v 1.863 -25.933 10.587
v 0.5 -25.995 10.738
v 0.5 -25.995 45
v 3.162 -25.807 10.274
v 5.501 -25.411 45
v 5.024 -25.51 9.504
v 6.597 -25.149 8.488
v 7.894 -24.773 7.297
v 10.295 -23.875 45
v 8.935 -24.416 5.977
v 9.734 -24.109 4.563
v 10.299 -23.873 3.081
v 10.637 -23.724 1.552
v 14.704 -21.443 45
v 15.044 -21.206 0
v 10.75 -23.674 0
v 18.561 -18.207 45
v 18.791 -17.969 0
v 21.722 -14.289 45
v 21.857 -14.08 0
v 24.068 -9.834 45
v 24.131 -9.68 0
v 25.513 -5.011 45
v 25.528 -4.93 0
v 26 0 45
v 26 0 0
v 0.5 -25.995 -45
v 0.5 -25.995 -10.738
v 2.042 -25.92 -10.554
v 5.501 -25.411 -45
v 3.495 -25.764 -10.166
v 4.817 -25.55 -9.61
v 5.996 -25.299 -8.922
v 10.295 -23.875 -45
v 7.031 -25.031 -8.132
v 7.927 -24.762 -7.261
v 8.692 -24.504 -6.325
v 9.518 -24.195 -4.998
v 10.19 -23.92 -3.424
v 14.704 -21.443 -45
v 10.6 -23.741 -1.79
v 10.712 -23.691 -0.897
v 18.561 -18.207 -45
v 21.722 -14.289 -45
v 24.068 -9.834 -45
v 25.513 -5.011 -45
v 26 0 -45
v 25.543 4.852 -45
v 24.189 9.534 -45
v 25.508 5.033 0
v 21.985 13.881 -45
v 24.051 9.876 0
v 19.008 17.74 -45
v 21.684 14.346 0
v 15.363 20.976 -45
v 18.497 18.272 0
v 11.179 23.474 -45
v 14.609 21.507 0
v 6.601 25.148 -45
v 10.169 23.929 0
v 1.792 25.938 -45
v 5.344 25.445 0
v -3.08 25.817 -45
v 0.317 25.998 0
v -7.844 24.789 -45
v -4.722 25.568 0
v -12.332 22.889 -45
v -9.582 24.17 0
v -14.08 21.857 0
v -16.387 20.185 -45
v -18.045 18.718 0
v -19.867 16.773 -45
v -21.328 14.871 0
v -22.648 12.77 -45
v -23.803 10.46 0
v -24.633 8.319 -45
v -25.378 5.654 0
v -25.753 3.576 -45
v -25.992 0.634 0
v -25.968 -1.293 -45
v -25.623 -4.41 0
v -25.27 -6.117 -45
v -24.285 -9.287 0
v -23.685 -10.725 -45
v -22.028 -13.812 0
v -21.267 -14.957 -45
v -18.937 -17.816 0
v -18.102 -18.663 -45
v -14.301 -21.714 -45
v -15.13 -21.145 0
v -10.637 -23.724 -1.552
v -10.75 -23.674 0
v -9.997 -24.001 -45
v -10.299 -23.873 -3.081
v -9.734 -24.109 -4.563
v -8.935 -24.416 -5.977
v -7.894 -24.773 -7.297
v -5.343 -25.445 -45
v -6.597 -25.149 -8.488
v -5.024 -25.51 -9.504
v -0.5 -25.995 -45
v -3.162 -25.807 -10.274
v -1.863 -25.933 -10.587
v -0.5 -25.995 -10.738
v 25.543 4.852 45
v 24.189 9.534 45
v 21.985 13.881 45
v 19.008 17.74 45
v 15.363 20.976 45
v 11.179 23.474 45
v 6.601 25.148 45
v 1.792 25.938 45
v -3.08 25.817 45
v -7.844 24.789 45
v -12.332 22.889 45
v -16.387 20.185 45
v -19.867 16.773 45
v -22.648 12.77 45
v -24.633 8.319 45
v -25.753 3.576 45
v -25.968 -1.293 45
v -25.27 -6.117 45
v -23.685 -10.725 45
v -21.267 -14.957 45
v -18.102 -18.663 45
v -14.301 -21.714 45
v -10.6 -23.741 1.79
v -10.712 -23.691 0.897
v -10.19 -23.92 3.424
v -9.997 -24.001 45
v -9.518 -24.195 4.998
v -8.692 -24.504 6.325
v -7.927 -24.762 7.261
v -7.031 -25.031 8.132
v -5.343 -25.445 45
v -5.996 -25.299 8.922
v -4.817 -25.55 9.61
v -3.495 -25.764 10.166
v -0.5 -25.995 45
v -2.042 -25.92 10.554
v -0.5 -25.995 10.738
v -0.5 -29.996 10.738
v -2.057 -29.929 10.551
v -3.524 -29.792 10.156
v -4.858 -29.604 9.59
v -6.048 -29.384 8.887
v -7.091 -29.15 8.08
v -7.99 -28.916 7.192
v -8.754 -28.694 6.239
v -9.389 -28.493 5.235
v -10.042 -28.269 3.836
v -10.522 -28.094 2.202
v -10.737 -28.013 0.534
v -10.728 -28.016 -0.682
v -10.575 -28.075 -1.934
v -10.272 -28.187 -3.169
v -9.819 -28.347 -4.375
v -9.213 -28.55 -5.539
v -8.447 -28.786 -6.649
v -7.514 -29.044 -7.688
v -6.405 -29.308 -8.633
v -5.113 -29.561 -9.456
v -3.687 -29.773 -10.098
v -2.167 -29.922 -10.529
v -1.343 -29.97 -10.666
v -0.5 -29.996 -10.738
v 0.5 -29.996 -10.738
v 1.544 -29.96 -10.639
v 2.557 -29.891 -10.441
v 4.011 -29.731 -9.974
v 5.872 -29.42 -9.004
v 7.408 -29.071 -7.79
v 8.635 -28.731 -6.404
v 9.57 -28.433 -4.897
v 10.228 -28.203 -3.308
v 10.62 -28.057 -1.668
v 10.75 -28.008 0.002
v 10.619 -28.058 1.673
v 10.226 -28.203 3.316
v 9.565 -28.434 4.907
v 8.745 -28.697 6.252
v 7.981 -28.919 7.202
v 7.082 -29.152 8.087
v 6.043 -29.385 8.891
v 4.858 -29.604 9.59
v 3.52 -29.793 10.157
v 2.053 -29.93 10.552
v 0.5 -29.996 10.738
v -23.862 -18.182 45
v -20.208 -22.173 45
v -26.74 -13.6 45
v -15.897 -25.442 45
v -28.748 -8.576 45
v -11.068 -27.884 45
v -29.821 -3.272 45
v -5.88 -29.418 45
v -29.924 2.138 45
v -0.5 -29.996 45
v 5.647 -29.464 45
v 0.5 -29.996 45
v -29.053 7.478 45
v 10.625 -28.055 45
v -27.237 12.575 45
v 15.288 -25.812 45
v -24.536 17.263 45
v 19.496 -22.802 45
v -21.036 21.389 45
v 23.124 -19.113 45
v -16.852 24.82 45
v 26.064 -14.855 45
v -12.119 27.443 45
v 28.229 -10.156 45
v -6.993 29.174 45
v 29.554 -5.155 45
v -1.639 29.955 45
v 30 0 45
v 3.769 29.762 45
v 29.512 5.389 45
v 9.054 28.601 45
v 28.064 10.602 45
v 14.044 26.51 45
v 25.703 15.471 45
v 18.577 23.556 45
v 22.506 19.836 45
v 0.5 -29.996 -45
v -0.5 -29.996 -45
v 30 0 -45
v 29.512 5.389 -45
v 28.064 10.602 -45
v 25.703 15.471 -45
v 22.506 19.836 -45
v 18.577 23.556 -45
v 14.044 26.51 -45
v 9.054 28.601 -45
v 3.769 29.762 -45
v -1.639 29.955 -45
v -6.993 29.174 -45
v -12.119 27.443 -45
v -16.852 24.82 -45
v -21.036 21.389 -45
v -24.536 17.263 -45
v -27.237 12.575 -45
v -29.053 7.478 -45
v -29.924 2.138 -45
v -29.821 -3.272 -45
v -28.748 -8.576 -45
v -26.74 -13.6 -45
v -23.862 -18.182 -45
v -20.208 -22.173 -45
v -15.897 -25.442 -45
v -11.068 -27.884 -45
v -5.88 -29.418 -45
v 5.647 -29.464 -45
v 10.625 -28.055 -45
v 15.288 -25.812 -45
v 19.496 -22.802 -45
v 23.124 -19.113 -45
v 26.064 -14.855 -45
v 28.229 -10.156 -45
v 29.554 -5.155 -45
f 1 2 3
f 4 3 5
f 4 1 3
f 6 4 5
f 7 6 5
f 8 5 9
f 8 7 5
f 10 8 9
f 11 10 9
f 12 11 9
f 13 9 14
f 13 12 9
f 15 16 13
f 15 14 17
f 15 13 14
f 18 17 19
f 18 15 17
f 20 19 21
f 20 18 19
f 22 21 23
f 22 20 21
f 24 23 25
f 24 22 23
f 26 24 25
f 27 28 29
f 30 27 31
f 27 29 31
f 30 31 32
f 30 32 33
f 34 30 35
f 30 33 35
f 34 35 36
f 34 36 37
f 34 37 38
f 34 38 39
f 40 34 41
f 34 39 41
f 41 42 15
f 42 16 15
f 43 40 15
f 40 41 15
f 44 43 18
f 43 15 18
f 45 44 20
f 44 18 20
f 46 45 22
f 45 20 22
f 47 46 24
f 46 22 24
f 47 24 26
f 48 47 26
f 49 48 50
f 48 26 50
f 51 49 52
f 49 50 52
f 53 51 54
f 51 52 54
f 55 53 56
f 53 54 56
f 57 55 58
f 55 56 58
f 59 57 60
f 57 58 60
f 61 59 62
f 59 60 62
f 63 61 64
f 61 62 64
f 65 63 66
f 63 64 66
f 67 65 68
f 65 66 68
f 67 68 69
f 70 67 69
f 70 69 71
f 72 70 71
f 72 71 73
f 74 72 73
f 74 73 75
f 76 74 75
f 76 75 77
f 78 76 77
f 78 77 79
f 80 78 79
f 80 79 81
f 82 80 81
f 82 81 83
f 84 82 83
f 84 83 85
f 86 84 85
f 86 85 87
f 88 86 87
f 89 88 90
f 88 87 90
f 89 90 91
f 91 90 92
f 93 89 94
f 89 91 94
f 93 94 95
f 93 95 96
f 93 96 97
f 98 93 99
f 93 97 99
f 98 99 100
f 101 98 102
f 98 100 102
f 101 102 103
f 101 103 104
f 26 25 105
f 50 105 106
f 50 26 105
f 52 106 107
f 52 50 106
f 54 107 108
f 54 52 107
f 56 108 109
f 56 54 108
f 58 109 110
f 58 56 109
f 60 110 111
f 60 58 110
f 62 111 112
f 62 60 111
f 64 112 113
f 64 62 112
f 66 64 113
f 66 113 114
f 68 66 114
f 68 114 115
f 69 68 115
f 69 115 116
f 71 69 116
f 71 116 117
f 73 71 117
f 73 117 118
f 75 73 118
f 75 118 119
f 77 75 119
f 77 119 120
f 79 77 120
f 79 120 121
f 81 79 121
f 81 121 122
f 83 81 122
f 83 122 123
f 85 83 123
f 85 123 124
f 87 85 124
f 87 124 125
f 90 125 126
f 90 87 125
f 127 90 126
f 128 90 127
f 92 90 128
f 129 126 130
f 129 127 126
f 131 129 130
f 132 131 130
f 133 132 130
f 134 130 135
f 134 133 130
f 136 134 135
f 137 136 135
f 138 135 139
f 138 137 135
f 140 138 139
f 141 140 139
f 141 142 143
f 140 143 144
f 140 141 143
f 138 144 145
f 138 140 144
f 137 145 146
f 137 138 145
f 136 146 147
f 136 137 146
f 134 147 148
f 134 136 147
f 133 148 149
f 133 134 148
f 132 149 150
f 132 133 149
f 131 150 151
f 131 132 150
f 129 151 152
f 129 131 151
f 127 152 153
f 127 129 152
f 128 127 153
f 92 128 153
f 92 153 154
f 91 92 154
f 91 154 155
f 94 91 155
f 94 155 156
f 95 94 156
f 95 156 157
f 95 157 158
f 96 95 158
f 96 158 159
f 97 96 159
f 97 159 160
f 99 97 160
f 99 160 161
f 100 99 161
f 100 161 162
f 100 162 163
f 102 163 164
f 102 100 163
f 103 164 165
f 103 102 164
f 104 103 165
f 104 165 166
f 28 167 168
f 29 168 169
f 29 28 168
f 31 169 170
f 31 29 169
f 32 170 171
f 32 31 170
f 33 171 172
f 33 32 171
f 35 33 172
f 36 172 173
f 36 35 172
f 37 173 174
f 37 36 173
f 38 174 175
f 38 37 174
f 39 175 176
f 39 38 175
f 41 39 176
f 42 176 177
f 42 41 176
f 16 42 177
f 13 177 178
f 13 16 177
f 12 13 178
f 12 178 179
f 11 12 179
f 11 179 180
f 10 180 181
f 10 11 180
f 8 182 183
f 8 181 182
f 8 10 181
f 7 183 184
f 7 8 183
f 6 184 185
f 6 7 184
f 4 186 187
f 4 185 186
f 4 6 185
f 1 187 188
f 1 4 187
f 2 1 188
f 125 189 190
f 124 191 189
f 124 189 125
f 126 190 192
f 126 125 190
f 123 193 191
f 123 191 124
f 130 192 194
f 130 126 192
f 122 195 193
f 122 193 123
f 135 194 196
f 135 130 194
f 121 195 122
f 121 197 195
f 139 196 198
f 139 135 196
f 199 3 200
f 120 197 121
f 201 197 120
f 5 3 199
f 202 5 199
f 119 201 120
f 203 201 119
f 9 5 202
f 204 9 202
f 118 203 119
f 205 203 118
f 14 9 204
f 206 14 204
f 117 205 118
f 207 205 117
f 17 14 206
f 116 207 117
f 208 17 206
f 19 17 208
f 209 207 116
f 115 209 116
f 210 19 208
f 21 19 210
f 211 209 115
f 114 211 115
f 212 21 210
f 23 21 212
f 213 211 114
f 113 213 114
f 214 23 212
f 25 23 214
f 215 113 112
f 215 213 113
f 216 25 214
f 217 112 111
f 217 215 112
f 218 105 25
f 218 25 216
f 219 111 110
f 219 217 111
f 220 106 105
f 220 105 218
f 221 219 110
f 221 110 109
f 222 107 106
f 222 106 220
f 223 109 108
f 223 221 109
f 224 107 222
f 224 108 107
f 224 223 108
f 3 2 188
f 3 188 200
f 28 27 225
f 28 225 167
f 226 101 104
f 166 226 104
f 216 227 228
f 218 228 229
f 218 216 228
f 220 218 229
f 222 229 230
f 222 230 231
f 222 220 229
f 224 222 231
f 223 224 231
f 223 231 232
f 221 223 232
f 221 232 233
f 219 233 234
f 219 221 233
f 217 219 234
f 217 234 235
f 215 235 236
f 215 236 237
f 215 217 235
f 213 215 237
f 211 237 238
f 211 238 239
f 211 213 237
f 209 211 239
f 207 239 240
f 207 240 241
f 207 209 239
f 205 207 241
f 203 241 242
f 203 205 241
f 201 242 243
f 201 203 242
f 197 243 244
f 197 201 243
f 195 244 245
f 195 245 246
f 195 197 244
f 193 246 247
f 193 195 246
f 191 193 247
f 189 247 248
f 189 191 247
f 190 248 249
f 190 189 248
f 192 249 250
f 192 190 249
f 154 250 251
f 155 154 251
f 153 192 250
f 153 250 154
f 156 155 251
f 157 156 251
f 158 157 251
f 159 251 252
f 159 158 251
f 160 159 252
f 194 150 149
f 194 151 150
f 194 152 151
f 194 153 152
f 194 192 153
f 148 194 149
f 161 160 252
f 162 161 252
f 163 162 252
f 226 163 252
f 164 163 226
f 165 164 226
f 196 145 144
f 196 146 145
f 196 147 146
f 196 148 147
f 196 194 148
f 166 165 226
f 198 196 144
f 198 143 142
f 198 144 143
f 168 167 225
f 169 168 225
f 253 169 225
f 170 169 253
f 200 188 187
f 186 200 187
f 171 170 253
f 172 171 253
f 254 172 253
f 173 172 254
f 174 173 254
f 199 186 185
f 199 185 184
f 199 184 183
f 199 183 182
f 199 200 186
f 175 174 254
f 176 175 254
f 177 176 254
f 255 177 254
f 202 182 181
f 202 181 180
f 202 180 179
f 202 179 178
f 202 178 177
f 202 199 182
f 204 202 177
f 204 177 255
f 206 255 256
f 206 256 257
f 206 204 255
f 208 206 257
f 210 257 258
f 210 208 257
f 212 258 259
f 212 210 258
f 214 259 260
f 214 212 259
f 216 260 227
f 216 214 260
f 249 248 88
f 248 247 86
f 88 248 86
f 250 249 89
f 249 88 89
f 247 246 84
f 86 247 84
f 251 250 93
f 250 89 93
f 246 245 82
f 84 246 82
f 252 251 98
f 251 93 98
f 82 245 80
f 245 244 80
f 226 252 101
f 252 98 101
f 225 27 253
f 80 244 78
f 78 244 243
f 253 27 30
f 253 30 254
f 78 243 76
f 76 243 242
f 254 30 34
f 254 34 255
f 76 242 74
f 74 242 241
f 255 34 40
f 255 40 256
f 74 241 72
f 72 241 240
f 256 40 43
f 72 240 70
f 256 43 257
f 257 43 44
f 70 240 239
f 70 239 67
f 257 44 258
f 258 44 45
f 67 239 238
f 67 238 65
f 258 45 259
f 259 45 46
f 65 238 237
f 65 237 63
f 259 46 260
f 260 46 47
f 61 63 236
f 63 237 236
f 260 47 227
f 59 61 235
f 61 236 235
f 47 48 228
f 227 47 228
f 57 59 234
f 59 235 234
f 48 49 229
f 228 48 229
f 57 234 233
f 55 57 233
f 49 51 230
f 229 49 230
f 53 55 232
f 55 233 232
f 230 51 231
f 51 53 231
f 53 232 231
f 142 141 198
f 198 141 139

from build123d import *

# Parameters (mm, degrees)
SKETCH009_R       = 30
SKETCH009_R_2     = 26
PAD002_DEPTH      = 45
PAD002_DEPTH_BACK = 45
SKETCH010_R       = 10.75
POCKET007_DEPTH   = 30.001
SKETCH027_W       = 1
SKETCH027_H       = 90
POCKET012_DEPTH   = 30.001


with BuildPart() as part:
    # Sketch009 → Pad002 (new body, two sides)
    with BuildSketch(Plane.XY) as pad002_sk:
        Circle(SKETCH009_R)
        Circle(SKETCH009_R_2, mode=Mode.SUBTRACT)
    extrude(amount=PAD002_DEPTH)
    extrude(pad002_sk.sketch, amount=-PAD002_DEPTH_BACK)

    # Sketch010 → Pocket007 (cut, through all)
    with BuildSketch(Plane.XZ):
        Circle(SKETCH010_R)
    extrude(amount=POCKET007_DEPTH, mode=Mode.SUBTRACT)

    # Sketch027 → Pocket012 (cut, through all)
    with BuildSketch(Plane.XZ):
        Rectangle(SKETCH027_W, SKETCH027_H)
    extrude(amount=POCKET012_DEPTH, mode=Mode.SUBTRACT)


solid = part.part
